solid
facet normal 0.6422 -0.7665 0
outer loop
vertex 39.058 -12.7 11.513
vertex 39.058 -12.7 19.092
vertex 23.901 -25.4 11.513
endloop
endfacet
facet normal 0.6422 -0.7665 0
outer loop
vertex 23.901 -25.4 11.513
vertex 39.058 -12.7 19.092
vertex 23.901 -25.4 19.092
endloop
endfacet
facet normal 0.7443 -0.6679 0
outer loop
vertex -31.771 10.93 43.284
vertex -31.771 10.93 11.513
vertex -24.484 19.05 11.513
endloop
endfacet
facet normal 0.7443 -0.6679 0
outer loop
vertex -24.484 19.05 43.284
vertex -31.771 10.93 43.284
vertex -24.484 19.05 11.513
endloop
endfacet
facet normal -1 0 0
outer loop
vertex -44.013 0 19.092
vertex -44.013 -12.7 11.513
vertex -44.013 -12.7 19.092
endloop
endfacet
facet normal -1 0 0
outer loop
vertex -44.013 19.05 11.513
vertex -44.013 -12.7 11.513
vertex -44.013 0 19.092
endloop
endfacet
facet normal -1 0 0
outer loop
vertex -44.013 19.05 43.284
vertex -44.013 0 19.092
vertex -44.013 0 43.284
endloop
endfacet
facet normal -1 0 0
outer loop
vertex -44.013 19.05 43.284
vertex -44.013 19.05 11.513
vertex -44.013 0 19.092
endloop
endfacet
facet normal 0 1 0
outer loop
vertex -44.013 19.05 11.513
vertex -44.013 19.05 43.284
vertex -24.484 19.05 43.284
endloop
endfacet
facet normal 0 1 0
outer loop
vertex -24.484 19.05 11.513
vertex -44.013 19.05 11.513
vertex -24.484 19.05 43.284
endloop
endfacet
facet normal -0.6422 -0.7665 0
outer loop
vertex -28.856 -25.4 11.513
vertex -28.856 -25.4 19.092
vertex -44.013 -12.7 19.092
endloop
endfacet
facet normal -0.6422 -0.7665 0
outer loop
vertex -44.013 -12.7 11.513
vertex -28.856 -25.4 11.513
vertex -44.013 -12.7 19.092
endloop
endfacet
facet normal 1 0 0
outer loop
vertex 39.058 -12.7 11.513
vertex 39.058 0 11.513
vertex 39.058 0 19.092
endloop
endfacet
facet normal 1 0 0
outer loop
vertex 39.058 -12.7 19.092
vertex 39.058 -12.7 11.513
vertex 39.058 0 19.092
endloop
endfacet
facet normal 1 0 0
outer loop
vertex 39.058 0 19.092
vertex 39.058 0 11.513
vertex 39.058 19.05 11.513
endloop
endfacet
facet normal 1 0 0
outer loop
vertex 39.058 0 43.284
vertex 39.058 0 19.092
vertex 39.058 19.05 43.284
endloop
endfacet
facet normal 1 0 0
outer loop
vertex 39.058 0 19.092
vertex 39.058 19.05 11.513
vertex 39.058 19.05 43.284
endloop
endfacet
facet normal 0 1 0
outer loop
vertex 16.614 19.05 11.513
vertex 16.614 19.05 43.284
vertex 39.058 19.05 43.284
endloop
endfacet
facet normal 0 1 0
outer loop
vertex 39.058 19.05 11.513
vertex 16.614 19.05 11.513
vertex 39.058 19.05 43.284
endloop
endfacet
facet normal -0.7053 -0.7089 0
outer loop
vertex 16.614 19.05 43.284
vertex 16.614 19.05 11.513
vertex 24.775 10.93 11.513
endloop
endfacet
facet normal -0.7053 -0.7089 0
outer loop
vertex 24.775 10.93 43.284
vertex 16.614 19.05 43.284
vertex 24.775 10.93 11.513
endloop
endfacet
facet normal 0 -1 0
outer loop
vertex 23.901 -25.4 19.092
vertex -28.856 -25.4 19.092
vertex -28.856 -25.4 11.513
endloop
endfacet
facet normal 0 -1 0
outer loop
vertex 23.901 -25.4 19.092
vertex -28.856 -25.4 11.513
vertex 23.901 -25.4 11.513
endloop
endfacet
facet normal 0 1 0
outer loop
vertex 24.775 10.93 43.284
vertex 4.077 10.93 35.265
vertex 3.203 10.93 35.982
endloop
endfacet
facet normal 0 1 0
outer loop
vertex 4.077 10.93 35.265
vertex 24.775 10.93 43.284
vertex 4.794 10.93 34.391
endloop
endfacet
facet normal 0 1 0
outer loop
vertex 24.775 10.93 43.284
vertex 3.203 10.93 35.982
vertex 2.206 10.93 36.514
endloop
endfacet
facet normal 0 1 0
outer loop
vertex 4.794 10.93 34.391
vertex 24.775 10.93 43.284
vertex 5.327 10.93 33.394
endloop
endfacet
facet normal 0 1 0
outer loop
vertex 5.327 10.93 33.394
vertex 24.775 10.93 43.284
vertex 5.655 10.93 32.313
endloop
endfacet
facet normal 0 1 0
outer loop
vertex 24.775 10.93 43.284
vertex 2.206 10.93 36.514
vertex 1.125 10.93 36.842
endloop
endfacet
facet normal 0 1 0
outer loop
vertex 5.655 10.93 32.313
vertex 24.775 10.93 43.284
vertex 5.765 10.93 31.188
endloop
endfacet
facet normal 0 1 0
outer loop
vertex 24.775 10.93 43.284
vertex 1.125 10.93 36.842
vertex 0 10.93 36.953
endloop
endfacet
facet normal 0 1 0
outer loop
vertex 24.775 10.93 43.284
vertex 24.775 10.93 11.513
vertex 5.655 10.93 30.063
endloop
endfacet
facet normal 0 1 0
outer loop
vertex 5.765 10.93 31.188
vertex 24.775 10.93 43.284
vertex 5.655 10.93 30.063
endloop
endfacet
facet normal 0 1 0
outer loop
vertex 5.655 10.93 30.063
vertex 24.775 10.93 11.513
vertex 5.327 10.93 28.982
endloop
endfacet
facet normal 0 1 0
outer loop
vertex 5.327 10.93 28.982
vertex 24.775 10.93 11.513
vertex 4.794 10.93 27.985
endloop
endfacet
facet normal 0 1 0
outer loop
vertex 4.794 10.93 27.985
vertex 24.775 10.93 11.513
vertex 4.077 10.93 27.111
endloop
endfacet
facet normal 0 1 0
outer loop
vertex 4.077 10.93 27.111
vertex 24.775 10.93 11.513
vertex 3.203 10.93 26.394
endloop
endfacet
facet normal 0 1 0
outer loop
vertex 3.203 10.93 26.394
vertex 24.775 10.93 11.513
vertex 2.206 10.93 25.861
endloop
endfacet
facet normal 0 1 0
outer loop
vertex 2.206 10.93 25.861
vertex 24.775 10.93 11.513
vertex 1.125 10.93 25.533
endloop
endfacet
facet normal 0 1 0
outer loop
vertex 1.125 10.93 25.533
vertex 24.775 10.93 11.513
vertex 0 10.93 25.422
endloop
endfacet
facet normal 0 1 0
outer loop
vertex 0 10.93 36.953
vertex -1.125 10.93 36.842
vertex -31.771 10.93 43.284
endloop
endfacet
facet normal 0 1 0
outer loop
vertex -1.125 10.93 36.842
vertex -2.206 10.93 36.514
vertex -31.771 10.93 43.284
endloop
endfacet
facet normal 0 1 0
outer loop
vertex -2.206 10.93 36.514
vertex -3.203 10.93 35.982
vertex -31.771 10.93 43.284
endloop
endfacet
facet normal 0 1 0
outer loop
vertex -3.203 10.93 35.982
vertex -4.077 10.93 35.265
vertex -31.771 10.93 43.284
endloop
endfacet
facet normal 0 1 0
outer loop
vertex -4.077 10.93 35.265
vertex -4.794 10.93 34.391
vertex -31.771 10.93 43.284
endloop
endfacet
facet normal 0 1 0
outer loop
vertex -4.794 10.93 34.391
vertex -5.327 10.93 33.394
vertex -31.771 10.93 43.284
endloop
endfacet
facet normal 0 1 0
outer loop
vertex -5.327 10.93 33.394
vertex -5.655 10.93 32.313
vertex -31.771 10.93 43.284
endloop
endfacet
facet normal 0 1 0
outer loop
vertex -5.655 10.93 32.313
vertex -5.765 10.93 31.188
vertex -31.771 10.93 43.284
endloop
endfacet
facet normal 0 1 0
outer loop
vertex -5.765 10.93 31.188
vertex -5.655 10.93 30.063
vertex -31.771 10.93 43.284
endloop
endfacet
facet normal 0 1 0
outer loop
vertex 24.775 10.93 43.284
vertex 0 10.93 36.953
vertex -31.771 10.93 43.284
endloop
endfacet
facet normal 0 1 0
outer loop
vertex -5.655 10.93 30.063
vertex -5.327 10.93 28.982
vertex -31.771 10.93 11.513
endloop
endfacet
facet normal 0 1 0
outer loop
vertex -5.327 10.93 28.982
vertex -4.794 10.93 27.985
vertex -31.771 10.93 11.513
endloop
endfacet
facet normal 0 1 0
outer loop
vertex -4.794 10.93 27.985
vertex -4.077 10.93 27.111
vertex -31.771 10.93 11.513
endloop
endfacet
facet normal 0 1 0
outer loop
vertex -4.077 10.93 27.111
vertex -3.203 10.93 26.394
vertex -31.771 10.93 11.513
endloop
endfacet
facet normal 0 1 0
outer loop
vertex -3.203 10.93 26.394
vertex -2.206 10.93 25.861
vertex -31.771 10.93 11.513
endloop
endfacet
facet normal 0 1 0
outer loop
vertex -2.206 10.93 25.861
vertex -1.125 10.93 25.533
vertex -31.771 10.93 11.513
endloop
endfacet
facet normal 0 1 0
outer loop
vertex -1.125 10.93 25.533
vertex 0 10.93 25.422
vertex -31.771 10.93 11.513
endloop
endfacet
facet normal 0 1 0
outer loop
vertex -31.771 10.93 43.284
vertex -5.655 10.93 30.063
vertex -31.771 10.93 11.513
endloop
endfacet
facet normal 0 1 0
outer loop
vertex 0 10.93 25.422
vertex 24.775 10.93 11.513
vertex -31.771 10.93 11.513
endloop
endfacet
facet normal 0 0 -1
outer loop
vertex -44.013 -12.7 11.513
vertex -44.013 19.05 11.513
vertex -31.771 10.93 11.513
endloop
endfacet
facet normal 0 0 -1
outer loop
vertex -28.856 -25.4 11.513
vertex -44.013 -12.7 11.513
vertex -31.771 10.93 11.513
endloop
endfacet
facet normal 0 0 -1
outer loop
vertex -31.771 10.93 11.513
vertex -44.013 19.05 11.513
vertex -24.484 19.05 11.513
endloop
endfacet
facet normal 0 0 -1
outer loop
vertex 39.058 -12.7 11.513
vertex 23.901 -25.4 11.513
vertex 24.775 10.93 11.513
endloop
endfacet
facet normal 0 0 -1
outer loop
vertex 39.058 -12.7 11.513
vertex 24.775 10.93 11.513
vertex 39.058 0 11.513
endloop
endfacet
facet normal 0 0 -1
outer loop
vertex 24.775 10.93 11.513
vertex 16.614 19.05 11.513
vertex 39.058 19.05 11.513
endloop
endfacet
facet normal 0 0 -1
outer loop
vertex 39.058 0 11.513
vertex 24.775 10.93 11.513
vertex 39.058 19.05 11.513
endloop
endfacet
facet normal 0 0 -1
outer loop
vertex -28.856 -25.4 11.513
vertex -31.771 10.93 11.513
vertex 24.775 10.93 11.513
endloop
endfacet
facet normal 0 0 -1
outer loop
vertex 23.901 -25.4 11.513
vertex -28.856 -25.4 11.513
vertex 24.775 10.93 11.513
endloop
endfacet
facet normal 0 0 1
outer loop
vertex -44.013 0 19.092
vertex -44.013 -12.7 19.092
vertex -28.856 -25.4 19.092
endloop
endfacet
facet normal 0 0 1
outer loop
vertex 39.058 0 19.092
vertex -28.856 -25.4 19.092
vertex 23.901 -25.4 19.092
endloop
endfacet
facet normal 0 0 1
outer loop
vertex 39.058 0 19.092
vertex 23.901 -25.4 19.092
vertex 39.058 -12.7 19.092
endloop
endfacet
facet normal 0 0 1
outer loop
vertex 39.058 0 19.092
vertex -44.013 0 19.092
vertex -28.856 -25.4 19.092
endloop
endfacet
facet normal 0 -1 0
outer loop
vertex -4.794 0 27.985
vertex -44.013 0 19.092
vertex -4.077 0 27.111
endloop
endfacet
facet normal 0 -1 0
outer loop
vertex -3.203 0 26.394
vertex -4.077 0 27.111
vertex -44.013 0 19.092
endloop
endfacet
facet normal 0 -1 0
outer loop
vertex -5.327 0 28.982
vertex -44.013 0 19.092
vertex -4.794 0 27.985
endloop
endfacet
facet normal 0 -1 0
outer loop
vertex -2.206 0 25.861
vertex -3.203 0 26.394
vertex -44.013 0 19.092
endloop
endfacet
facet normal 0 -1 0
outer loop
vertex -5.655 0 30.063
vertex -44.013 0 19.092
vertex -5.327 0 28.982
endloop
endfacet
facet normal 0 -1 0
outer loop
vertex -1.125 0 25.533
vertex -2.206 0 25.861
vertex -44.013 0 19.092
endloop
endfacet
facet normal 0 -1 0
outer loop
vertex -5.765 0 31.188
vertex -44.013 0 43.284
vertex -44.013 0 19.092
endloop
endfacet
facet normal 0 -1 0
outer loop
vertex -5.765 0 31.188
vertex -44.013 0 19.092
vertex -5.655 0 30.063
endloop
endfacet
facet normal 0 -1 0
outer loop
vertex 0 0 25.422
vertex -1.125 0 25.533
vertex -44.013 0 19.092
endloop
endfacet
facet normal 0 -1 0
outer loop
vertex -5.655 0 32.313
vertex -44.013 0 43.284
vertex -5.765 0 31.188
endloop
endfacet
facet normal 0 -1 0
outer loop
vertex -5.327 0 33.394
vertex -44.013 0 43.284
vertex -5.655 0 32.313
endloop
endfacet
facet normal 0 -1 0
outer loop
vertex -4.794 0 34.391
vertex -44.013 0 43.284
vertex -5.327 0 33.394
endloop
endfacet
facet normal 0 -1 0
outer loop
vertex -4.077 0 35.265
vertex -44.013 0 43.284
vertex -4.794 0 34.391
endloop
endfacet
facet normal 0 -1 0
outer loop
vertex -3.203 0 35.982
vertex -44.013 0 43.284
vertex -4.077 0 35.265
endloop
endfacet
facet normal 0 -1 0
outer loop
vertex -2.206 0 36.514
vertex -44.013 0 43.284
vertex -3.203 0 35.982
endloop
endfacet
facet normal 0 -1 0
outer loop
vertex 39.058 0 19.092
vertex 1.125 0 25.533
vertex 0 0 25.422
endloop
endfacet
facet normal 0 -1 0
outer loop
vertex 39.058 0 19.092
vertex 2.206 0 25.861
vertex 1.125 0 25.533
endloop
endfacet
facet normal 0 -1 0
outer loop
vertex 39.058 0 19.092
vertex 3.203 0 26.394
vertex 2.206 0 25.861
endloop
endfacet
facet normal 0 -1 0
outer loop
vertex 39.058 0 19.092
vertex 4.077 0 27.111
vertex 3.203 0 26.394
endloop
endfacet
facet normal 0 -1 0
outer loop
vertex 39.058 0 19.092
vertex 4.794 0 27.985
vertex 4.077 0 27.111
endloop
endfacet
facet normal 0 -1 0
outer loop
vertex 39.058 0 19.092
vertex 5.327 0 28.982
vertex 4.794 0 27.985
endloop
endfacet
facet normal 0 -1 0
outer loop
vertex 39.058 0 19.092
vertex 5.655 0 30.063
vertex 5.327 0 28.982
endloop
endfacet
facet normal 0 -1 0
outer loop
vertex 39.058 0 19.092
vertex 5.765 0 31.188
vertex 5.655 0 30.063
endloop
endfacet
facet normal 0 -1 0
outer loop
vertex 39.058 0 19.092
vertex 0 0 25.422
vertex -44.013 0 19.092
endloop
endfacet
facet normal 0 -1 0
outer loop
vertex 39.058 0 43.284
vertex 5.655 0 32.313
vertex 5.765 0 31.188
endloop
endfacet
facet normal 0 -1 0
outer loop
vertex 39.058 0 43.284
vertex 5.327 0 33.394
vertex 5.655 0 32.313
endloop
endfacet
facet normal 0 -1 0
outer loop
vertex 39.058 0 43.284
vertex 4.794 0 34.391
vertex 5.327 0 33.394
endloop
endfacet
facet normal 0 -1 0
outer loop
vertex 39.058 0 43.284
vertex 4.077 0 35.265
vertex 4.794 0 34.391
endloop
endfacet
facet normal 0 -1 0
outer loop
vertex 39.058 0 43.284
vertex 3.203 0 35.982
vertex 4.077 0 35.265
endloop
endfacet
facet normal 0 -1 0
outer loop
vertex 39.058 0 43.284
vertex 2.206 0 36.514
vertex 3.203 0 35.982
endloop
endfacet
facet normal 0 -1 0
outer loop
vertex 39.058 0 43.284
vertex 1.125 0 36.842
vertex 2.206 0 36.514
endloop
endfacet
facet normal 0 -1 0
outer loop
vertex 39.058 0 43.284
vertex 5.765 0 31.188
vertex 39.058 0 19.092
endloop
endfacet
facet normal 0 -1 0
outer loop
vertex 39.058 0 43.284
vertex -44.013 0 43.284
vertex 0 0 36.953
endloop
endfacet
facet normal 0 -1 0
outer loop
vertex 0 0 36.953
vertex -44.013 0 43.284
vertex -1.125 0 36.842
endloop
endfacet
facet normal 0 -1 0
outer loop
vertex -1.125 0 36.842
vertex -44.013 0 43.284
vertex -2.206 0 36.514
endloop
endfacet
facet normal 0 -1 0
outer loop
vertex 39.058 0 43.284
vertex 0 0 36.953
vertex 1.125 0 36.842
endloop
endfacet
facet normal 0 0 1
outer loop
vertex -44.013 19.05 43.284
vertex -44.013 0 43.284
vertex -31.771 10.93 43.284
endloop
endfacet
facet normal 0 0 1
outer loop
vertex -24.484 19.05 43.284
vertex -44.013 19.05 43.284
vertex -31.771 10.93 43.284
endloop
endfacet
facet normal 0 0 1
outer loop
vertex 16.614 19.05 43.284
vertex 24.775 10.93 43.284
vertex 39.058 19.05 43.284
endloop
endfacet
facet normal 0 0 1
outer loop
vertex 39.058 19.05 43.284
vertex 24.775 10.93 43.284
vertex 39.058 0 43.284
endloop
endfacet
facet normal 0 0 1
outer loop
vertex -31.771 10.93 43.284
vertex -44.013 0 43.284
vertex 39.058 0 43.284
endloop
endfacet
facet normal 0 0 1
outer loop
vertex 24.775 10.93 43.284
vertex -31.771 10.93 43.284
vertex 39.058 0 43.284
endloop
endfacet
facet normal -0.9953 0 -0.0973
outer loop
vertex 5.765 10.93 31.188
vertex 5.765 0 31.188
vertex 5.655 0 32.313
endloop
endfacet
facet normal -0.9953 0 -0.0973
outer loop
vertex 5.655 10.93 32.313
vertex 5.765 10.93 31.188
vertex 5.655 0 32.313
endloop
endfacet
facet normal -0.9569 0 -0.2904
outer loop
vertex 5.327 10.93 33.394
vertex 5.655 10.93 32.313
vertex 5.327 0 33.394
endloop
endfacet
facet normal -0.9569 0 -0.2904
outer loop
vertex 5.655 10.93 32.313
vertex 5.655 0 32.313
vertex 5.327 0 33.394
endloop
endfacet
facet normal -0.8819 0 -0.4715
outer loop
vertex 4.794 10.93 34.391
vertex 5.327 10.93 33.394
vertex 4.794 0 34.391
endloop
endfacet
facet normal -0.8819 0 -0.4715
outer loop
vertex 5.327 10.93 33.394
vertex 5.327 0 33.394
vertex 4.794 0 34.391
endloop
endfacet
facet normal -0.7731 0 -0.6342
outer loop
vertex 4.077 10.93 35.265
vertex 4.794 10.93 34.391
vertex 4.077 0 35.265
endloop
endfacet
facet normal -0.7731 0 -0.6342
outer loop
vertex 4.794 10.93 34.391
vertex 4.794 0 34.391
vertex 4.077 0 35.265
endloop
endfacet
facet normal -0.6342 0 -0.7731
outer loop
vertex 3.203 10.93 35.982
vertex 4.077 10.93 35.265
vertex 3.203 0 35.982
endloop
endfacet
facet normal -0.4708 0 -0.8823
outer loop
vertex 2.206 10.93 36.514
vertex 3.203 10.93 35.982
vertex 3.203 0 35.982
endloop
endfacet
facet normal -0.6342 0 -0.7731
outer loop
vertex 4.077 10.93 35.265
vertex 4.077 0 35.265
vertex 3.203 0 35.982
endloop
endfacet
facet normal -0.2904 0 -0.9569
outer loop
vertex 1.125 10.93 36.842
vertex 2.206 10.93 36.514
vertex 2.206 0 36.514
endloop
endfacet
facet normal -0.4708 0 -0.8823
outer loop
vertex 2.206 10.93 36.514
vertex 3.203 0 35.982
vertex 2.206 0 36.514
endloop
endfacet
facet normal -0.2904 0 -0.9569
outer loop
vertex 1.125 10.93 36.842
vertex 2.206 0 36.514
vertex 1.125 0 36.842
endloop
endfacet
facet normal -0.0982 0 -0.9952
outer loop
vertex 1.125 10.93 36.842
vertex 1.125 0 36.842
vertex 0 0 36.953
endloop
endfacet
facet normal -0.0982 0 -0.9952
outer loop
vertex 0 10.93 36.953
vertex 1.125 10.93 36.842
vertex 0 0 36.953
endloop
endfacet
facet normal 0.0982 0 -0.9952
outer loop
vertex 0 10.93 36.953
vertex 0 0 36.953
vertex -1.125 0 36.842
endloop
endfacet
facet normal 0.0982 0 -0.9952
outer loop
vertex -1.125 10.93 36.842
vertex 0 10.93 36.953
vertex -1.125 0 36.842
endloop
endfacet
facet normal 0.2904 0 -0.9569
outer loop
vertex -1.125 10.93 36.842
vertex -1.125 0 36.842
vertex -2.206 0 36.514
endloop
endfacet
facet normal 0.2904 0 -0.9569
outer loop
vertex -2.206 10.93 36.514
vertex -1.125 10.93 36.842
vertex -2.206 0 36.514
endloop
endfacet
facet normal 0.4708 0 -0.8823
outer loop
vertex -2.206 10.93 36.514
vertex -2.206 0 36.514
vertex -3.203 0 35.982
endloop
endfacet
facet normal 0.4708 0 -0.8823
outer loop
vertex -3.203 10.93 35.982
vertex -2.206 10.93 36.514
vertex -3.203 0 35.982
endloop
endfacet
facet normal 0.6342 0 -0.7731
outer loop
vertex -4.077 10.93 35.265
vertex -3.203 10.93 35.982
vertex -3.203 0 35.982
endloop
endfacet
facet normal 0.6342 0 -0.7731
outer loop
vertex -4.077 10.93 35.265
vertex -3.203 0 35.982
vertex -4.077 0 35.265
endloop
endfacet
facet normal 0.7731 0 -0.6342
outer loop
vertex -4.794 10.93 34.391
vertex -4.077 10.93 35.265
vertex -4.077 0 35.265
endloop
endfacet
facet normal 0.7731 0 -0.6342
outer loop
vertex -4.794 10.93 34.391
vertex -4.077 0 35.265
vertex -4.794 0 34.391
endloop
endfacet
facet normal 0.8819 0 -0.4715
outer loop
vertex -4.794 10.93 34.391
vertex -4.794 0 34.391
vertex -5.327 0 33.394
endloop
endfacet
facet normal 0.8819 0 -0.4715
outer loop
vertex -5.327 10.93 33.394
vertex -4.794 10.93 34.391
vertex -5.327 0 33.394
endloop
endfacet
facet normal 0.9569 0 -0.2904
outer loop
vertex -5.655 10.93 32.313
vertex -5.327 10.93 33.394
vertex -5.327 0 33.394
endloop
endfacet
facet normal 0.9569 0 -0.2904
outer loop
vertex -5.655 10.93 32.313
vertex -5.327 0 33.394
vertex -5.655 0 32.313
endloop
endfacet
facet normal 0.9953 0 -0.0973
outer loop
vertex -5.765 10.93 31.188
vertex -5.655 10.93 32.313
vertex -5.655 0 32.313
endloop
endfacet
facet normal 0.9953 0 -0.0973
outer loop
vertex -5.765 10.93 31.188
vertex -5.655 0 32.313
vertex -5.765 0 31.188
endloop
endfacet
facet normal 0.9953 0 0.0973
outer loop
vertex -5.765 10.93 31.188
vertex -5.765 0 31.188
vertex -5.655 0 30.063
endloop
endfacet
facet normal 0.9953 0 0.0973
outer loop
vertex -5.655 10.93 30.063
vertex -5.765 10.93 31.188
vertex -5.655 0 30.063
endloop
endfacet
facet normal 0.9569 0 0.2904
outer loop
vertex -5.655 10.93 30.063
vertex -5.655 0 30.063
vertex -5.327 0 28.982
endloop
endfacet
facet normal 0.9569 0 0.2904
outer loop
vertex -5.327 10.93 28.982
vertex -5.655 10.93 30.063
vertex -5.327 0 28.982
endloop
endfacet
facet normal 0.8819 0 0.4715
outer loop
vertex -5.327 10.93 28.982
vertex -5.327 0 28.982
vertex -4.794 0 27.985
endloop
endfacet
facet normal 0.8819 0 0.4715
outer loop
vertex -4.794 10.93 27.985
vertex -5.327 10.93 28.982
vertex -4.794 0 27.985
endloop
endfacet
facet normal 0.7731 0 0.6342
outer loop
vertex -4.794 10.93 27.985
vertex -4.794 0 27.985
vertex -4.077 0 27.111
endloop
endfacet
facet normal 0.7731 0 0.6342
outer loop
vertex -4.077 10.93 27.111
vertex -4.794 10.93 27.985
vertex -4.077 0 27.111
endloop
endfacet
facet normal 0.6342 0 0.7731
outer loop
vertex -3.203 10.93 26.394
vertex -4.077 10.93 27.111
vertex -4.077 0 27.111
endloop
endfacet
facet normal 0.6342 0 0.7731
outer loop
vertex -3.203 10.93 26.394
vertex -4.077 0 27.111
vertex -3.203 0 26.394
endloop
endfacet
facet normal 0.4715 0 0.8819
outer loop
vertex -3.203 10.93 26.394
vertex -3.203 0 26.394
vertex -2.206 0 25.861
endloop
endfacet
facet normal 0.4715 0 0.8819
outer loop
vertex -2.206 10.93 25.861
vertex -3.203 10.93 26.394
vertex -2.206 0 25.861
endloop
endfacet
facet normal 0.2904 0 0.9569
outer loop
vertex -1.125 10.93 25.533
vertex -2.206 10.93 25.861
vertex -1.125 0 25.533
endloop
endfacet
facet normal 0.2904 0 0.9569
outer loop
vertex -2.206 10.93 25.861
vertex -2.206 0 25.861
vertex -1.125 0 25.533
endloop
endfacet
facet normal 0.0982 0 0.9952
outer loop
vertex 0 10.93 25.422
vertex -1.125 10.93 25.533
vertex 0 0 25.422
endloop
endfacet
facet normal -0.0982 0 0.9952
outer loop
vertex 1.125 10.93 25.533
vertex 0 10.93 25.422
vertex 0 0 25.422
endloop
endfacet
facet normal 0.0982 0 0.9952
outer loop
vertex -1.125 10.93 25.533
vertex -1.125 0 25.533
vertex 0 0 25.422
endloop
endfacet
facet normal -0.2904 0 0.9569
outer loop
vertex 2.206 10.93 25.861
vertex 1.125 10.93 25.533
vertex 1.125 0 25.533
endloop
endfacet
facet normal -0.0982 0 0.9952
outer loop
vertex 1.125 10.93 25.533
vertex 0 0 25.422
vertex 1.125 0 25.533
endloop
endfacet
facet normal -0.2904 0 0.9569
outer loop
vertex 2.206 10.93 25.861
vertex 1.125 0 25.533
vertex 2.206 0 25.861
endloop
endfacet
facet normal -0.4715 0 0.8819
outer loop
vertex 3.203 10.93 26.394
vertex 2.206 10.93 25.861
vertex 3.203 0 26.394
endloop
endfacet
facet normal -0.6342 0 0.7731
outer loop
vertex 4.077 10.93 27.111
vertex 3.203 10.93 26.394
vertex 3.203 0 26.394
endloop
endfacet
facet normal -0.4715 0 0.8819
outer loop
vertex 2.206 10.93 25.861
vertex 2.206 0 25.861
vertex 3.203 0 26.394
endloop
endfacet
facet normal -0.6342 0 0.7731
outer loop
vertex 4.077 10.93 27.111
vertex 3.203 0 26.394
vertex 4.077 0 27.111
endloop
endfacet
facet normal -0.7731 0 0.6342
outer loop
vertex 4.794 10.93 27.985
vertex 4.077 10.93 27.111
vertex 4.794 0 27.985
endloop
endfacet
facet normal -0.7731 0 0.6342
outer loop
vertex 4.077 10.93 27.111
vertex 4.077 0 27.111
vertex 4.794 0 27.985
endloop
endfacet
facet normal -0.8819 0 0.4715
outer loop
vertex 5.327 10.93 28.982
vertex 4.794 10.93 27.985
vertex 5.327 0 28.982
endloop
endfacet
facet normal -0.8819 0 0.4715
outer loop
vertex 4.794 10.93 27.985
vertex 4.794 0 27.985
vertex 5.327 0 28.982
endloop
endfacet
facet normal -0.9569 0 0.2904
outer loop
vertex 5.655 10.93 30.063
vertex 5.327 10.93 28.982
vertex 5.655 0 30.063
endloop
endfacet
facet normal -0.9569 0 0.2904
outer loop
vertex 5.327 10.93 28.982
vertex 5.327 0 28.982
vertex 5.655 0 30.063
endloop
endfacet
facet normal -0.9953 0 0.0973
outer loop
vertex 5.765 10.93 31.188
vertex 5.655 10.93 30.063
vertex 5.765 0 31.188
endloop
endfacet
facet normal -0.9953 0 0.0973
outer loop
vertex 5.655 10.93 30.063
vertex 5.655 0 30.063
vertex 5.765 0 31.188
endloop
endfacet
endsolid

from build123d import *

# Parameters (mm, degrees)
F0_W     = 83.0704942346
F0_H     = 31.7708207294
F1_DEPTH = 19.05
F3_DEPTH = 35.052
F4_W     = 83.0704942346
F4_H     = 7.5783608481
F5_DEPTH = 25.4
F7_DEPTH = 25.4
F8_R     = 5.7653950386
F9_DEPTH = 25.4


with BuildPart() as f1:
    # F0 (on Front) → F1 (new body)
    with BuildSketch(Plane.XZ):
        with Locations((-2.4775415659, 27.3986891843)):
            Rectangle(F0_W, F0_H)
    extrude(amount=-F1_DEPTH)

    # F2 (on face) → F3 (cut)
    with BuildSketch(Plane(origin=(0, 0, 11.5132788196), x_dir=(1, 0, 0), z_dir=(0, 0, -1))):
        Polygon((-31.7708216608, -10.9303286299), (-24.4839340448, -19.05), (16.6140999645, -19.05), (24.775410071, -10.9303286299), align=None)
    extrude(amount=-F3_DEPTH, mode=Mode.SUBTRACT)

    # F4 (on face) → F5 (join)
    with BuildSketch(Plane.XZ):
        with Locations((-2.4775415659, 15.3024592437)):
            Rectangle(F4_W, F4_H)
    extrude(amount=F5_DEPTH)

    # F6 (on face) → F7 (cut)
    with BuildSketch(Plane.XY.offset(19.0916396677)):
        Polygon((39.0577055514, -25.4), (39.0577055514, -12.7), (23.9009838551, -25.4), align=None)
        Polygon((-44.0127886832, -25.4), (-28.8560669869, -25.4), (-44.0127886832, -12.7), align=None)
    extrude(amount=-F7_DEPTH, mode=Mode.SUBTRACT)

    # F8 (on face) → F9 (cut)
    with BuildSketch(Plane.XZ):
        with Locations((0, 31.1878696084)):
            Circle(F8_R)
    extrude(amount=-F9_DEPTH, mode=Mode.SUBTRACT)


solid = f1.part
